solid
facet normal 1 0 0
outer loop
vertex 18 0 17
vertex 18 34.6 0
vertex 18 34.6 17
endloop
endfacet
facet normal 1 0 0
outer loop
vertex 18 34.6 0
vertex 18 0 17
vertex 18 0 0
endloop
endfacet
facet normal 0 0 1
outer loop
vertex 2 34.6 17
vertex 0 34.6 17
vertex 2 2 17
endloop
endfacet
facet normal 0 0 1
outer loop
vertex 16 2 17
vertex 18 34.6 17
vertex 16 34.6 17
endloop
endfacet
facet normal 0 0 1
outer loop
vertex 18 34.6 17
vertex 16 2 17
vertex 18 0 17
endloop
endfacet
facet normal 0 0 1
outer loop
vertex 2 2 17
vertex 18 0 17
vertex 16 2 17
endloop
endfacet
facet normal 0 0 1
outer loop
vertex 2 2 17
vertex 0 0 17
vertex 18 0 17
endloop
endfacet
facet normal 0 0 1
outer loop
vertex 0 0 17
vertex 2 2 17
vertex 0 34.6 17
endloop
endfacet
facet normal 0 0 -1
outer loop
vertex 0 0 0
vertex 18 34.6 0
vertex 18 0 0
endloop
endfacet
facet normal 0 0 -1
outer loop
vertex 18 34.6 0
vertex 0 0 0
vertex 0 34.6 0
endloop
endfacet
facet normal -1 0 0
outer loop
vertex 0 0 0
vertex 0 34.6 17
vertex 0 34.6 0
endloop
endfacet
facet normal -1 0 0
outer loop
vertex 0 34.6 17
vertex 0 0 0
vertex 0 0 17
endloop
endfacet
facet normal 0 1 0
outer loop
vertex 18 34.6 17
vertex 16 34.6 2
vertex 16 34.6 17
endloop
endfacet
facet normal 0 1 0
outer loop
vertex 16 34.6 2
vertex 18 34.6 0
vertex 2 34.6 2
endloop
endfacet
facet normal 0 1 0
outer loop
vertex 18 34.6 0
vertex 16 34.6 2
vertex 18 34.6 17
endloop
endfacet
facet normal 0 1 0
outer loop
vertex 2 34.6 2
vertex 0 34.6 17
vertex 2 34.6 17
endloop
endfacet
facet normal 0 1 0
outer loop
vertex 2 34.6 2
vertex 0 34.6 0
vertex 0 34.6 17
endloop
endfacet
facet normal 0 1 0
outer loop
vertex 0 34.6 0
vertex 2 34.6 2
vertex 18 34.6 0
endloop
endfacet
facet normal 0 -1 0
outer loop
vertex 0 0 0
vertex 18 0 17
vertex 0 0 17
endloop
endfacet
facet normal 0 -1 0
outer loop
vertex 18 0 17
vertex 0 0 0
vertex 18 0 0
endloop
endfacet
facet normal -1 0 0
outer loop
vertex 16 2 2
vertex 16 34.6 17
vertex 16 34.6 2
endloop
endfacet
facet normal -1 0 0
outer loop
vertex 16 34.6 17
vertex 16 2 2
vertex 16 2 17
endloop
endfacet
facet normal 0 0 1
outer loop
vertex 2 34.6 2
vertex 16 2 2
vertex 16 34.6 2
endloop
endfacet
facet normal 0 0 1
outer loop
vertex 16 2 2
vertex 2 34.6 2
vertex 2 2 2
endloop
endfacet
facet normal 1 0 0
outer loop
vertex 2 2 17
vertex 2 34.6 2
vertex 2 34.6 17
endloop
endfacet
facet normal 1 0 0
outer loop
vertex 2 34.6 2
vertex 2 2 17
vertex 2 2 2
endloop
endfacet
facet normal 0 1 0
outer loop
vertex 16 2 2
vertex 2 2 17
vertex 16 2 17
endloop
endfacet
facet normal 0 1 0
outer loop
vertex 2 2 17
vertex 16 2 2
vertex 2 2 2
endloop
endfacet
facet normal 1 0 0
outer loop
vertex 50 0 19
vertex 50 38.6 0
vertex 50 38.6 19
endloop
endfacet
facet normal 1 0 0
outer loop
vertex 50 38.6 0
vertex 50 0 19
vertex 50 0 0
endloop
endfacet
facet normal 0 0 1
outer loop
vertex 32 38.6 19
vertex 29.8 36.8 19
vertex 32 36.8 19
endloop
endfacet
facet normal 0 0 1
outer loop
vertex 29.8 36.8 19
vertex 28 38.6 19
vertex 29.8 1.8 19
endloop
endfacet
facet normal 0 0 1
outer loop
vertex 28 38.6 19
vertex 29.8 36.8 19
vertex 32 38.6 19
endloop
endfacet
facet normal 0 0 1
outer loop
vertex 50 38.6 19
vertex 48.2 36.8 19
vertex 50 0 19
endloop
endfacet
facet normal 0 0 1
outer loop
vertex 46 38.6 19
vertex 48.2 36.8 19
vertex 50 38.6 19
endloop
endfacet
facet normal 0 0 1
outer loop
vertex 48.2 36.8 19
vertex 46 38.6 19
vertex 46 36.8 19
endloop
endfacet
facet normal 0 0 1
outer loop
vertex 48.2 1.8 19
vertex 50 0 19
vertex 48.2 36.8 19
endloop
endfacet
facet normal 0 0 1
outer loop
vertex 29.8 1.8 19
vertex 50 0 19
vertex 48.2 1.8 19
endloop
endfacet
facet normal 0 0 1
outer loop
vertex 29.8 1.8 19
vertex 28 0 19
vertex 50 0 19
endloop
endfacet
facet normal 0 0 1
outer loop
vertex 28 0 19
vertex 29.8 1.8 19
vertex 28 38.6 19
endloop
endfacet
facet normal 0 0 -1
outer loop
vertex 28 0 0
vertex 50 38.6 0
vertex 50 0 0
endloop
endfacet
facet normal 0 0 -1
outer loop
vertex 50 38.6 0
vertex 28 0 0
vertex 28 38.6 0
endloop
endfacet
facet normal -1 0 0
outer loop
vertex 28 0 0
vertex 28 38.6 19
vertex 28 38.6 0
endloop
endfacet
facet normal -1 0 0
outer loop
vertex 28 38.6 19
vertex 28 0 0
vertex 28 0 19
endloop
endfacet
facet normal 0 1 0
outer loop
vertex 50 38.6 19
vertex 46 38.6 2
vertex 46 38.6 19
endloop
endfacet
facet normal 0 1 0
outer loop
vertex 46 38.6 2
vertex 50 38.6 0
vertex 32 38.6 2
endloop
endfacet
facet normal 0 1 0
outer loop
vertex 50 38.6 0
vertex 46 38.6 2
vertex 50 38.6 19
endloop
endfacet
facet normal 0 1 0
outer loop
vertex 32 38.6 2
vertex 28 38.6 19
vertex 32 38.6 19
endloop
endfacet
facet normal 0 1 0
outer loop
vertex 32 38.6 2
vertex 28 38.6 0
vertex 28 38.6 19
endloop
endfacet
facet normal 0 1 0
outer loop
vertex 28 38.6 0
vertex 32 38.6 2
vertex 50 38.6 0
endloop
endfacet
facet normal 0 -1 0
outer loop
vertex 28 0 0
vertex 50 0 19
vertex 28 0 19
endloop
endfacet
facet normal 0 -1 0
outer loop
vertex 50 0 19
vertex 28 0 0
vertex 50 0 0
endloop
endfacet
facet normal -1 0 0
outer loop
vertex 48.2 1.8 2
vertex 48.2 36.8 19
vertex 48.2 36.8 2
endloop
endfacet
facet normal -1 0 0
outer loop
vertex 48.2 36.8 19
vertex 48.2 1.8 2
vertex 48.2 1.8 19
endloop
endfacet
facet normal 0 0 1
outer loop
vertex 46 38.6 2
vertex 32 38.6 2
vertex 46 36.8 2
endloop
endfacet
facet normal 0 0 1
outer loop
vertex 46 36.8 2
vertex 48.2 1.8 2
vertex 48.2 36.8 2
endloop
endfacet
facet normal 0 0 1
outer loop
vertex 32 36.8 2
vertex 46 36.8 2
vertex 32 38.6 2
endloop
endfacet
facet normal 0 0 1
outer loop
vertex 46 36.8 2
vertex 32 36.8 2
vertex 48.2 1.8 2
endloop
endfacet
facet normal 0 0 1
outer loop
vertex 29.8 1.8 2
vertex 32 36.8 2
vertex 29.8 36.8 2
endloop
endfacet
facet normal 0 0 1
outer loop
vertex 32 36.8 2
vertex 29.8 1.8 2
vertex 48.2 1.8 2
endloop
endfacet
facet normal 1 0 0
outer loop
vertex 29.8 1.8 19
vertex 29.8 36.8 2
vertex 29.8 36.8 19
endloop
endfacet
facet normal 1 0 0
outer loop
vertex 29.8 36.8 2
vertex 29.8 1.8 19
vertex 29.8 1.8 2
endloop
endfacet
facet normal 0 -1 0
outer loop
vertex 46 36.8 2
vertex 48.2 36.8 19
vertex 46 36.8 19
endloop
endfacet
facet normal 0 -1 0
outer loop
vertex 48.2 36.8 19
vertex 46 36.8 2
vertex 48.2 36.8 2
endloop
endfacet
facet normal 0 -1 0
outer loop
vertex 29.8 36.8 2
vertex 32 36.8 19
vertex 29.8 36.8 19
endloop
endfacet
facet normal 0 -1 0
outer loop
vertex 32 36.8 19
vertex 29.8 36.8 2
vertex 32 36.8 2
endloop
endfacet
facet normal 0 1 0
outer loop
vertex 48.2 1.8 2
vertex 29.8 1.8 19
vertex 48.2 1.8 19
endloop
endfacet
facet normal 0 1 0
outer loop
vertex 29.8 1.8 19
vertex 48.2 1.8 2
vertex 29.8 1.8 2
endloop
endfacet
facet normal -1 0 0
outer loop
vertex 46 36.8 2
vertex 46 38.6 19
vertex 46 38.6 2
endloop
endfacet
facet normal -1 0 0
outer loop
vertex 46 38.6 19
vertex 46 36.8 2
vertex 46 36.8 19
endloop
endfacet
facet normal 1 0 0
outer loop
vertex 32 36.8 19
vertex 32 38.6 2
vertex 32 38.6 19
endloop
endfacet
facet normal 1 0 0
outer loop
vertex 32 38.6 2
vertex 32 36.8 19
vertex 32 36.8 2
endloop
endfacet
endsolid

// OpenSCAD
snubWidth = 14;
snubLength = 30.6;
snubHeight = 15;

wallThickness = 2;

difference() {
    cube([snubWidth + 2 * wallThickness, snubLength + 2 * wallThickness, snubHeight + wallThickness]);
    translate([wallThickness, wallThickness, wallThickness]) {
        cube([snubWidth, snubLength + wallThickness + 0.1, snubHeight + 0.1]);
    }
}

translate([snubWidth * 2, 0, 0]) {
    difference() {
        cube([snubWidth + 4 * wallThickness, snubLength + 4 * wallThickness, snubHeight + 2 * wallThickness]);
        translate([wallThickness - 0.2, wallThickness - 0.2, wallThickness]) {
            cube([snubWidth + 2 * wallThickness + 0.4, snubLength + 2 * wallThickness + 0.4, wallThickness + snubHeight + 0.1]);
        }

        translate([wallThickness * 2, wallThickness * 2, wallThickness]) {
            cube([snubWidth, snubLength +  2 * wallThickness + 0.1, wallThickness + snubHeight + 0.1]);
        }
    }
}
